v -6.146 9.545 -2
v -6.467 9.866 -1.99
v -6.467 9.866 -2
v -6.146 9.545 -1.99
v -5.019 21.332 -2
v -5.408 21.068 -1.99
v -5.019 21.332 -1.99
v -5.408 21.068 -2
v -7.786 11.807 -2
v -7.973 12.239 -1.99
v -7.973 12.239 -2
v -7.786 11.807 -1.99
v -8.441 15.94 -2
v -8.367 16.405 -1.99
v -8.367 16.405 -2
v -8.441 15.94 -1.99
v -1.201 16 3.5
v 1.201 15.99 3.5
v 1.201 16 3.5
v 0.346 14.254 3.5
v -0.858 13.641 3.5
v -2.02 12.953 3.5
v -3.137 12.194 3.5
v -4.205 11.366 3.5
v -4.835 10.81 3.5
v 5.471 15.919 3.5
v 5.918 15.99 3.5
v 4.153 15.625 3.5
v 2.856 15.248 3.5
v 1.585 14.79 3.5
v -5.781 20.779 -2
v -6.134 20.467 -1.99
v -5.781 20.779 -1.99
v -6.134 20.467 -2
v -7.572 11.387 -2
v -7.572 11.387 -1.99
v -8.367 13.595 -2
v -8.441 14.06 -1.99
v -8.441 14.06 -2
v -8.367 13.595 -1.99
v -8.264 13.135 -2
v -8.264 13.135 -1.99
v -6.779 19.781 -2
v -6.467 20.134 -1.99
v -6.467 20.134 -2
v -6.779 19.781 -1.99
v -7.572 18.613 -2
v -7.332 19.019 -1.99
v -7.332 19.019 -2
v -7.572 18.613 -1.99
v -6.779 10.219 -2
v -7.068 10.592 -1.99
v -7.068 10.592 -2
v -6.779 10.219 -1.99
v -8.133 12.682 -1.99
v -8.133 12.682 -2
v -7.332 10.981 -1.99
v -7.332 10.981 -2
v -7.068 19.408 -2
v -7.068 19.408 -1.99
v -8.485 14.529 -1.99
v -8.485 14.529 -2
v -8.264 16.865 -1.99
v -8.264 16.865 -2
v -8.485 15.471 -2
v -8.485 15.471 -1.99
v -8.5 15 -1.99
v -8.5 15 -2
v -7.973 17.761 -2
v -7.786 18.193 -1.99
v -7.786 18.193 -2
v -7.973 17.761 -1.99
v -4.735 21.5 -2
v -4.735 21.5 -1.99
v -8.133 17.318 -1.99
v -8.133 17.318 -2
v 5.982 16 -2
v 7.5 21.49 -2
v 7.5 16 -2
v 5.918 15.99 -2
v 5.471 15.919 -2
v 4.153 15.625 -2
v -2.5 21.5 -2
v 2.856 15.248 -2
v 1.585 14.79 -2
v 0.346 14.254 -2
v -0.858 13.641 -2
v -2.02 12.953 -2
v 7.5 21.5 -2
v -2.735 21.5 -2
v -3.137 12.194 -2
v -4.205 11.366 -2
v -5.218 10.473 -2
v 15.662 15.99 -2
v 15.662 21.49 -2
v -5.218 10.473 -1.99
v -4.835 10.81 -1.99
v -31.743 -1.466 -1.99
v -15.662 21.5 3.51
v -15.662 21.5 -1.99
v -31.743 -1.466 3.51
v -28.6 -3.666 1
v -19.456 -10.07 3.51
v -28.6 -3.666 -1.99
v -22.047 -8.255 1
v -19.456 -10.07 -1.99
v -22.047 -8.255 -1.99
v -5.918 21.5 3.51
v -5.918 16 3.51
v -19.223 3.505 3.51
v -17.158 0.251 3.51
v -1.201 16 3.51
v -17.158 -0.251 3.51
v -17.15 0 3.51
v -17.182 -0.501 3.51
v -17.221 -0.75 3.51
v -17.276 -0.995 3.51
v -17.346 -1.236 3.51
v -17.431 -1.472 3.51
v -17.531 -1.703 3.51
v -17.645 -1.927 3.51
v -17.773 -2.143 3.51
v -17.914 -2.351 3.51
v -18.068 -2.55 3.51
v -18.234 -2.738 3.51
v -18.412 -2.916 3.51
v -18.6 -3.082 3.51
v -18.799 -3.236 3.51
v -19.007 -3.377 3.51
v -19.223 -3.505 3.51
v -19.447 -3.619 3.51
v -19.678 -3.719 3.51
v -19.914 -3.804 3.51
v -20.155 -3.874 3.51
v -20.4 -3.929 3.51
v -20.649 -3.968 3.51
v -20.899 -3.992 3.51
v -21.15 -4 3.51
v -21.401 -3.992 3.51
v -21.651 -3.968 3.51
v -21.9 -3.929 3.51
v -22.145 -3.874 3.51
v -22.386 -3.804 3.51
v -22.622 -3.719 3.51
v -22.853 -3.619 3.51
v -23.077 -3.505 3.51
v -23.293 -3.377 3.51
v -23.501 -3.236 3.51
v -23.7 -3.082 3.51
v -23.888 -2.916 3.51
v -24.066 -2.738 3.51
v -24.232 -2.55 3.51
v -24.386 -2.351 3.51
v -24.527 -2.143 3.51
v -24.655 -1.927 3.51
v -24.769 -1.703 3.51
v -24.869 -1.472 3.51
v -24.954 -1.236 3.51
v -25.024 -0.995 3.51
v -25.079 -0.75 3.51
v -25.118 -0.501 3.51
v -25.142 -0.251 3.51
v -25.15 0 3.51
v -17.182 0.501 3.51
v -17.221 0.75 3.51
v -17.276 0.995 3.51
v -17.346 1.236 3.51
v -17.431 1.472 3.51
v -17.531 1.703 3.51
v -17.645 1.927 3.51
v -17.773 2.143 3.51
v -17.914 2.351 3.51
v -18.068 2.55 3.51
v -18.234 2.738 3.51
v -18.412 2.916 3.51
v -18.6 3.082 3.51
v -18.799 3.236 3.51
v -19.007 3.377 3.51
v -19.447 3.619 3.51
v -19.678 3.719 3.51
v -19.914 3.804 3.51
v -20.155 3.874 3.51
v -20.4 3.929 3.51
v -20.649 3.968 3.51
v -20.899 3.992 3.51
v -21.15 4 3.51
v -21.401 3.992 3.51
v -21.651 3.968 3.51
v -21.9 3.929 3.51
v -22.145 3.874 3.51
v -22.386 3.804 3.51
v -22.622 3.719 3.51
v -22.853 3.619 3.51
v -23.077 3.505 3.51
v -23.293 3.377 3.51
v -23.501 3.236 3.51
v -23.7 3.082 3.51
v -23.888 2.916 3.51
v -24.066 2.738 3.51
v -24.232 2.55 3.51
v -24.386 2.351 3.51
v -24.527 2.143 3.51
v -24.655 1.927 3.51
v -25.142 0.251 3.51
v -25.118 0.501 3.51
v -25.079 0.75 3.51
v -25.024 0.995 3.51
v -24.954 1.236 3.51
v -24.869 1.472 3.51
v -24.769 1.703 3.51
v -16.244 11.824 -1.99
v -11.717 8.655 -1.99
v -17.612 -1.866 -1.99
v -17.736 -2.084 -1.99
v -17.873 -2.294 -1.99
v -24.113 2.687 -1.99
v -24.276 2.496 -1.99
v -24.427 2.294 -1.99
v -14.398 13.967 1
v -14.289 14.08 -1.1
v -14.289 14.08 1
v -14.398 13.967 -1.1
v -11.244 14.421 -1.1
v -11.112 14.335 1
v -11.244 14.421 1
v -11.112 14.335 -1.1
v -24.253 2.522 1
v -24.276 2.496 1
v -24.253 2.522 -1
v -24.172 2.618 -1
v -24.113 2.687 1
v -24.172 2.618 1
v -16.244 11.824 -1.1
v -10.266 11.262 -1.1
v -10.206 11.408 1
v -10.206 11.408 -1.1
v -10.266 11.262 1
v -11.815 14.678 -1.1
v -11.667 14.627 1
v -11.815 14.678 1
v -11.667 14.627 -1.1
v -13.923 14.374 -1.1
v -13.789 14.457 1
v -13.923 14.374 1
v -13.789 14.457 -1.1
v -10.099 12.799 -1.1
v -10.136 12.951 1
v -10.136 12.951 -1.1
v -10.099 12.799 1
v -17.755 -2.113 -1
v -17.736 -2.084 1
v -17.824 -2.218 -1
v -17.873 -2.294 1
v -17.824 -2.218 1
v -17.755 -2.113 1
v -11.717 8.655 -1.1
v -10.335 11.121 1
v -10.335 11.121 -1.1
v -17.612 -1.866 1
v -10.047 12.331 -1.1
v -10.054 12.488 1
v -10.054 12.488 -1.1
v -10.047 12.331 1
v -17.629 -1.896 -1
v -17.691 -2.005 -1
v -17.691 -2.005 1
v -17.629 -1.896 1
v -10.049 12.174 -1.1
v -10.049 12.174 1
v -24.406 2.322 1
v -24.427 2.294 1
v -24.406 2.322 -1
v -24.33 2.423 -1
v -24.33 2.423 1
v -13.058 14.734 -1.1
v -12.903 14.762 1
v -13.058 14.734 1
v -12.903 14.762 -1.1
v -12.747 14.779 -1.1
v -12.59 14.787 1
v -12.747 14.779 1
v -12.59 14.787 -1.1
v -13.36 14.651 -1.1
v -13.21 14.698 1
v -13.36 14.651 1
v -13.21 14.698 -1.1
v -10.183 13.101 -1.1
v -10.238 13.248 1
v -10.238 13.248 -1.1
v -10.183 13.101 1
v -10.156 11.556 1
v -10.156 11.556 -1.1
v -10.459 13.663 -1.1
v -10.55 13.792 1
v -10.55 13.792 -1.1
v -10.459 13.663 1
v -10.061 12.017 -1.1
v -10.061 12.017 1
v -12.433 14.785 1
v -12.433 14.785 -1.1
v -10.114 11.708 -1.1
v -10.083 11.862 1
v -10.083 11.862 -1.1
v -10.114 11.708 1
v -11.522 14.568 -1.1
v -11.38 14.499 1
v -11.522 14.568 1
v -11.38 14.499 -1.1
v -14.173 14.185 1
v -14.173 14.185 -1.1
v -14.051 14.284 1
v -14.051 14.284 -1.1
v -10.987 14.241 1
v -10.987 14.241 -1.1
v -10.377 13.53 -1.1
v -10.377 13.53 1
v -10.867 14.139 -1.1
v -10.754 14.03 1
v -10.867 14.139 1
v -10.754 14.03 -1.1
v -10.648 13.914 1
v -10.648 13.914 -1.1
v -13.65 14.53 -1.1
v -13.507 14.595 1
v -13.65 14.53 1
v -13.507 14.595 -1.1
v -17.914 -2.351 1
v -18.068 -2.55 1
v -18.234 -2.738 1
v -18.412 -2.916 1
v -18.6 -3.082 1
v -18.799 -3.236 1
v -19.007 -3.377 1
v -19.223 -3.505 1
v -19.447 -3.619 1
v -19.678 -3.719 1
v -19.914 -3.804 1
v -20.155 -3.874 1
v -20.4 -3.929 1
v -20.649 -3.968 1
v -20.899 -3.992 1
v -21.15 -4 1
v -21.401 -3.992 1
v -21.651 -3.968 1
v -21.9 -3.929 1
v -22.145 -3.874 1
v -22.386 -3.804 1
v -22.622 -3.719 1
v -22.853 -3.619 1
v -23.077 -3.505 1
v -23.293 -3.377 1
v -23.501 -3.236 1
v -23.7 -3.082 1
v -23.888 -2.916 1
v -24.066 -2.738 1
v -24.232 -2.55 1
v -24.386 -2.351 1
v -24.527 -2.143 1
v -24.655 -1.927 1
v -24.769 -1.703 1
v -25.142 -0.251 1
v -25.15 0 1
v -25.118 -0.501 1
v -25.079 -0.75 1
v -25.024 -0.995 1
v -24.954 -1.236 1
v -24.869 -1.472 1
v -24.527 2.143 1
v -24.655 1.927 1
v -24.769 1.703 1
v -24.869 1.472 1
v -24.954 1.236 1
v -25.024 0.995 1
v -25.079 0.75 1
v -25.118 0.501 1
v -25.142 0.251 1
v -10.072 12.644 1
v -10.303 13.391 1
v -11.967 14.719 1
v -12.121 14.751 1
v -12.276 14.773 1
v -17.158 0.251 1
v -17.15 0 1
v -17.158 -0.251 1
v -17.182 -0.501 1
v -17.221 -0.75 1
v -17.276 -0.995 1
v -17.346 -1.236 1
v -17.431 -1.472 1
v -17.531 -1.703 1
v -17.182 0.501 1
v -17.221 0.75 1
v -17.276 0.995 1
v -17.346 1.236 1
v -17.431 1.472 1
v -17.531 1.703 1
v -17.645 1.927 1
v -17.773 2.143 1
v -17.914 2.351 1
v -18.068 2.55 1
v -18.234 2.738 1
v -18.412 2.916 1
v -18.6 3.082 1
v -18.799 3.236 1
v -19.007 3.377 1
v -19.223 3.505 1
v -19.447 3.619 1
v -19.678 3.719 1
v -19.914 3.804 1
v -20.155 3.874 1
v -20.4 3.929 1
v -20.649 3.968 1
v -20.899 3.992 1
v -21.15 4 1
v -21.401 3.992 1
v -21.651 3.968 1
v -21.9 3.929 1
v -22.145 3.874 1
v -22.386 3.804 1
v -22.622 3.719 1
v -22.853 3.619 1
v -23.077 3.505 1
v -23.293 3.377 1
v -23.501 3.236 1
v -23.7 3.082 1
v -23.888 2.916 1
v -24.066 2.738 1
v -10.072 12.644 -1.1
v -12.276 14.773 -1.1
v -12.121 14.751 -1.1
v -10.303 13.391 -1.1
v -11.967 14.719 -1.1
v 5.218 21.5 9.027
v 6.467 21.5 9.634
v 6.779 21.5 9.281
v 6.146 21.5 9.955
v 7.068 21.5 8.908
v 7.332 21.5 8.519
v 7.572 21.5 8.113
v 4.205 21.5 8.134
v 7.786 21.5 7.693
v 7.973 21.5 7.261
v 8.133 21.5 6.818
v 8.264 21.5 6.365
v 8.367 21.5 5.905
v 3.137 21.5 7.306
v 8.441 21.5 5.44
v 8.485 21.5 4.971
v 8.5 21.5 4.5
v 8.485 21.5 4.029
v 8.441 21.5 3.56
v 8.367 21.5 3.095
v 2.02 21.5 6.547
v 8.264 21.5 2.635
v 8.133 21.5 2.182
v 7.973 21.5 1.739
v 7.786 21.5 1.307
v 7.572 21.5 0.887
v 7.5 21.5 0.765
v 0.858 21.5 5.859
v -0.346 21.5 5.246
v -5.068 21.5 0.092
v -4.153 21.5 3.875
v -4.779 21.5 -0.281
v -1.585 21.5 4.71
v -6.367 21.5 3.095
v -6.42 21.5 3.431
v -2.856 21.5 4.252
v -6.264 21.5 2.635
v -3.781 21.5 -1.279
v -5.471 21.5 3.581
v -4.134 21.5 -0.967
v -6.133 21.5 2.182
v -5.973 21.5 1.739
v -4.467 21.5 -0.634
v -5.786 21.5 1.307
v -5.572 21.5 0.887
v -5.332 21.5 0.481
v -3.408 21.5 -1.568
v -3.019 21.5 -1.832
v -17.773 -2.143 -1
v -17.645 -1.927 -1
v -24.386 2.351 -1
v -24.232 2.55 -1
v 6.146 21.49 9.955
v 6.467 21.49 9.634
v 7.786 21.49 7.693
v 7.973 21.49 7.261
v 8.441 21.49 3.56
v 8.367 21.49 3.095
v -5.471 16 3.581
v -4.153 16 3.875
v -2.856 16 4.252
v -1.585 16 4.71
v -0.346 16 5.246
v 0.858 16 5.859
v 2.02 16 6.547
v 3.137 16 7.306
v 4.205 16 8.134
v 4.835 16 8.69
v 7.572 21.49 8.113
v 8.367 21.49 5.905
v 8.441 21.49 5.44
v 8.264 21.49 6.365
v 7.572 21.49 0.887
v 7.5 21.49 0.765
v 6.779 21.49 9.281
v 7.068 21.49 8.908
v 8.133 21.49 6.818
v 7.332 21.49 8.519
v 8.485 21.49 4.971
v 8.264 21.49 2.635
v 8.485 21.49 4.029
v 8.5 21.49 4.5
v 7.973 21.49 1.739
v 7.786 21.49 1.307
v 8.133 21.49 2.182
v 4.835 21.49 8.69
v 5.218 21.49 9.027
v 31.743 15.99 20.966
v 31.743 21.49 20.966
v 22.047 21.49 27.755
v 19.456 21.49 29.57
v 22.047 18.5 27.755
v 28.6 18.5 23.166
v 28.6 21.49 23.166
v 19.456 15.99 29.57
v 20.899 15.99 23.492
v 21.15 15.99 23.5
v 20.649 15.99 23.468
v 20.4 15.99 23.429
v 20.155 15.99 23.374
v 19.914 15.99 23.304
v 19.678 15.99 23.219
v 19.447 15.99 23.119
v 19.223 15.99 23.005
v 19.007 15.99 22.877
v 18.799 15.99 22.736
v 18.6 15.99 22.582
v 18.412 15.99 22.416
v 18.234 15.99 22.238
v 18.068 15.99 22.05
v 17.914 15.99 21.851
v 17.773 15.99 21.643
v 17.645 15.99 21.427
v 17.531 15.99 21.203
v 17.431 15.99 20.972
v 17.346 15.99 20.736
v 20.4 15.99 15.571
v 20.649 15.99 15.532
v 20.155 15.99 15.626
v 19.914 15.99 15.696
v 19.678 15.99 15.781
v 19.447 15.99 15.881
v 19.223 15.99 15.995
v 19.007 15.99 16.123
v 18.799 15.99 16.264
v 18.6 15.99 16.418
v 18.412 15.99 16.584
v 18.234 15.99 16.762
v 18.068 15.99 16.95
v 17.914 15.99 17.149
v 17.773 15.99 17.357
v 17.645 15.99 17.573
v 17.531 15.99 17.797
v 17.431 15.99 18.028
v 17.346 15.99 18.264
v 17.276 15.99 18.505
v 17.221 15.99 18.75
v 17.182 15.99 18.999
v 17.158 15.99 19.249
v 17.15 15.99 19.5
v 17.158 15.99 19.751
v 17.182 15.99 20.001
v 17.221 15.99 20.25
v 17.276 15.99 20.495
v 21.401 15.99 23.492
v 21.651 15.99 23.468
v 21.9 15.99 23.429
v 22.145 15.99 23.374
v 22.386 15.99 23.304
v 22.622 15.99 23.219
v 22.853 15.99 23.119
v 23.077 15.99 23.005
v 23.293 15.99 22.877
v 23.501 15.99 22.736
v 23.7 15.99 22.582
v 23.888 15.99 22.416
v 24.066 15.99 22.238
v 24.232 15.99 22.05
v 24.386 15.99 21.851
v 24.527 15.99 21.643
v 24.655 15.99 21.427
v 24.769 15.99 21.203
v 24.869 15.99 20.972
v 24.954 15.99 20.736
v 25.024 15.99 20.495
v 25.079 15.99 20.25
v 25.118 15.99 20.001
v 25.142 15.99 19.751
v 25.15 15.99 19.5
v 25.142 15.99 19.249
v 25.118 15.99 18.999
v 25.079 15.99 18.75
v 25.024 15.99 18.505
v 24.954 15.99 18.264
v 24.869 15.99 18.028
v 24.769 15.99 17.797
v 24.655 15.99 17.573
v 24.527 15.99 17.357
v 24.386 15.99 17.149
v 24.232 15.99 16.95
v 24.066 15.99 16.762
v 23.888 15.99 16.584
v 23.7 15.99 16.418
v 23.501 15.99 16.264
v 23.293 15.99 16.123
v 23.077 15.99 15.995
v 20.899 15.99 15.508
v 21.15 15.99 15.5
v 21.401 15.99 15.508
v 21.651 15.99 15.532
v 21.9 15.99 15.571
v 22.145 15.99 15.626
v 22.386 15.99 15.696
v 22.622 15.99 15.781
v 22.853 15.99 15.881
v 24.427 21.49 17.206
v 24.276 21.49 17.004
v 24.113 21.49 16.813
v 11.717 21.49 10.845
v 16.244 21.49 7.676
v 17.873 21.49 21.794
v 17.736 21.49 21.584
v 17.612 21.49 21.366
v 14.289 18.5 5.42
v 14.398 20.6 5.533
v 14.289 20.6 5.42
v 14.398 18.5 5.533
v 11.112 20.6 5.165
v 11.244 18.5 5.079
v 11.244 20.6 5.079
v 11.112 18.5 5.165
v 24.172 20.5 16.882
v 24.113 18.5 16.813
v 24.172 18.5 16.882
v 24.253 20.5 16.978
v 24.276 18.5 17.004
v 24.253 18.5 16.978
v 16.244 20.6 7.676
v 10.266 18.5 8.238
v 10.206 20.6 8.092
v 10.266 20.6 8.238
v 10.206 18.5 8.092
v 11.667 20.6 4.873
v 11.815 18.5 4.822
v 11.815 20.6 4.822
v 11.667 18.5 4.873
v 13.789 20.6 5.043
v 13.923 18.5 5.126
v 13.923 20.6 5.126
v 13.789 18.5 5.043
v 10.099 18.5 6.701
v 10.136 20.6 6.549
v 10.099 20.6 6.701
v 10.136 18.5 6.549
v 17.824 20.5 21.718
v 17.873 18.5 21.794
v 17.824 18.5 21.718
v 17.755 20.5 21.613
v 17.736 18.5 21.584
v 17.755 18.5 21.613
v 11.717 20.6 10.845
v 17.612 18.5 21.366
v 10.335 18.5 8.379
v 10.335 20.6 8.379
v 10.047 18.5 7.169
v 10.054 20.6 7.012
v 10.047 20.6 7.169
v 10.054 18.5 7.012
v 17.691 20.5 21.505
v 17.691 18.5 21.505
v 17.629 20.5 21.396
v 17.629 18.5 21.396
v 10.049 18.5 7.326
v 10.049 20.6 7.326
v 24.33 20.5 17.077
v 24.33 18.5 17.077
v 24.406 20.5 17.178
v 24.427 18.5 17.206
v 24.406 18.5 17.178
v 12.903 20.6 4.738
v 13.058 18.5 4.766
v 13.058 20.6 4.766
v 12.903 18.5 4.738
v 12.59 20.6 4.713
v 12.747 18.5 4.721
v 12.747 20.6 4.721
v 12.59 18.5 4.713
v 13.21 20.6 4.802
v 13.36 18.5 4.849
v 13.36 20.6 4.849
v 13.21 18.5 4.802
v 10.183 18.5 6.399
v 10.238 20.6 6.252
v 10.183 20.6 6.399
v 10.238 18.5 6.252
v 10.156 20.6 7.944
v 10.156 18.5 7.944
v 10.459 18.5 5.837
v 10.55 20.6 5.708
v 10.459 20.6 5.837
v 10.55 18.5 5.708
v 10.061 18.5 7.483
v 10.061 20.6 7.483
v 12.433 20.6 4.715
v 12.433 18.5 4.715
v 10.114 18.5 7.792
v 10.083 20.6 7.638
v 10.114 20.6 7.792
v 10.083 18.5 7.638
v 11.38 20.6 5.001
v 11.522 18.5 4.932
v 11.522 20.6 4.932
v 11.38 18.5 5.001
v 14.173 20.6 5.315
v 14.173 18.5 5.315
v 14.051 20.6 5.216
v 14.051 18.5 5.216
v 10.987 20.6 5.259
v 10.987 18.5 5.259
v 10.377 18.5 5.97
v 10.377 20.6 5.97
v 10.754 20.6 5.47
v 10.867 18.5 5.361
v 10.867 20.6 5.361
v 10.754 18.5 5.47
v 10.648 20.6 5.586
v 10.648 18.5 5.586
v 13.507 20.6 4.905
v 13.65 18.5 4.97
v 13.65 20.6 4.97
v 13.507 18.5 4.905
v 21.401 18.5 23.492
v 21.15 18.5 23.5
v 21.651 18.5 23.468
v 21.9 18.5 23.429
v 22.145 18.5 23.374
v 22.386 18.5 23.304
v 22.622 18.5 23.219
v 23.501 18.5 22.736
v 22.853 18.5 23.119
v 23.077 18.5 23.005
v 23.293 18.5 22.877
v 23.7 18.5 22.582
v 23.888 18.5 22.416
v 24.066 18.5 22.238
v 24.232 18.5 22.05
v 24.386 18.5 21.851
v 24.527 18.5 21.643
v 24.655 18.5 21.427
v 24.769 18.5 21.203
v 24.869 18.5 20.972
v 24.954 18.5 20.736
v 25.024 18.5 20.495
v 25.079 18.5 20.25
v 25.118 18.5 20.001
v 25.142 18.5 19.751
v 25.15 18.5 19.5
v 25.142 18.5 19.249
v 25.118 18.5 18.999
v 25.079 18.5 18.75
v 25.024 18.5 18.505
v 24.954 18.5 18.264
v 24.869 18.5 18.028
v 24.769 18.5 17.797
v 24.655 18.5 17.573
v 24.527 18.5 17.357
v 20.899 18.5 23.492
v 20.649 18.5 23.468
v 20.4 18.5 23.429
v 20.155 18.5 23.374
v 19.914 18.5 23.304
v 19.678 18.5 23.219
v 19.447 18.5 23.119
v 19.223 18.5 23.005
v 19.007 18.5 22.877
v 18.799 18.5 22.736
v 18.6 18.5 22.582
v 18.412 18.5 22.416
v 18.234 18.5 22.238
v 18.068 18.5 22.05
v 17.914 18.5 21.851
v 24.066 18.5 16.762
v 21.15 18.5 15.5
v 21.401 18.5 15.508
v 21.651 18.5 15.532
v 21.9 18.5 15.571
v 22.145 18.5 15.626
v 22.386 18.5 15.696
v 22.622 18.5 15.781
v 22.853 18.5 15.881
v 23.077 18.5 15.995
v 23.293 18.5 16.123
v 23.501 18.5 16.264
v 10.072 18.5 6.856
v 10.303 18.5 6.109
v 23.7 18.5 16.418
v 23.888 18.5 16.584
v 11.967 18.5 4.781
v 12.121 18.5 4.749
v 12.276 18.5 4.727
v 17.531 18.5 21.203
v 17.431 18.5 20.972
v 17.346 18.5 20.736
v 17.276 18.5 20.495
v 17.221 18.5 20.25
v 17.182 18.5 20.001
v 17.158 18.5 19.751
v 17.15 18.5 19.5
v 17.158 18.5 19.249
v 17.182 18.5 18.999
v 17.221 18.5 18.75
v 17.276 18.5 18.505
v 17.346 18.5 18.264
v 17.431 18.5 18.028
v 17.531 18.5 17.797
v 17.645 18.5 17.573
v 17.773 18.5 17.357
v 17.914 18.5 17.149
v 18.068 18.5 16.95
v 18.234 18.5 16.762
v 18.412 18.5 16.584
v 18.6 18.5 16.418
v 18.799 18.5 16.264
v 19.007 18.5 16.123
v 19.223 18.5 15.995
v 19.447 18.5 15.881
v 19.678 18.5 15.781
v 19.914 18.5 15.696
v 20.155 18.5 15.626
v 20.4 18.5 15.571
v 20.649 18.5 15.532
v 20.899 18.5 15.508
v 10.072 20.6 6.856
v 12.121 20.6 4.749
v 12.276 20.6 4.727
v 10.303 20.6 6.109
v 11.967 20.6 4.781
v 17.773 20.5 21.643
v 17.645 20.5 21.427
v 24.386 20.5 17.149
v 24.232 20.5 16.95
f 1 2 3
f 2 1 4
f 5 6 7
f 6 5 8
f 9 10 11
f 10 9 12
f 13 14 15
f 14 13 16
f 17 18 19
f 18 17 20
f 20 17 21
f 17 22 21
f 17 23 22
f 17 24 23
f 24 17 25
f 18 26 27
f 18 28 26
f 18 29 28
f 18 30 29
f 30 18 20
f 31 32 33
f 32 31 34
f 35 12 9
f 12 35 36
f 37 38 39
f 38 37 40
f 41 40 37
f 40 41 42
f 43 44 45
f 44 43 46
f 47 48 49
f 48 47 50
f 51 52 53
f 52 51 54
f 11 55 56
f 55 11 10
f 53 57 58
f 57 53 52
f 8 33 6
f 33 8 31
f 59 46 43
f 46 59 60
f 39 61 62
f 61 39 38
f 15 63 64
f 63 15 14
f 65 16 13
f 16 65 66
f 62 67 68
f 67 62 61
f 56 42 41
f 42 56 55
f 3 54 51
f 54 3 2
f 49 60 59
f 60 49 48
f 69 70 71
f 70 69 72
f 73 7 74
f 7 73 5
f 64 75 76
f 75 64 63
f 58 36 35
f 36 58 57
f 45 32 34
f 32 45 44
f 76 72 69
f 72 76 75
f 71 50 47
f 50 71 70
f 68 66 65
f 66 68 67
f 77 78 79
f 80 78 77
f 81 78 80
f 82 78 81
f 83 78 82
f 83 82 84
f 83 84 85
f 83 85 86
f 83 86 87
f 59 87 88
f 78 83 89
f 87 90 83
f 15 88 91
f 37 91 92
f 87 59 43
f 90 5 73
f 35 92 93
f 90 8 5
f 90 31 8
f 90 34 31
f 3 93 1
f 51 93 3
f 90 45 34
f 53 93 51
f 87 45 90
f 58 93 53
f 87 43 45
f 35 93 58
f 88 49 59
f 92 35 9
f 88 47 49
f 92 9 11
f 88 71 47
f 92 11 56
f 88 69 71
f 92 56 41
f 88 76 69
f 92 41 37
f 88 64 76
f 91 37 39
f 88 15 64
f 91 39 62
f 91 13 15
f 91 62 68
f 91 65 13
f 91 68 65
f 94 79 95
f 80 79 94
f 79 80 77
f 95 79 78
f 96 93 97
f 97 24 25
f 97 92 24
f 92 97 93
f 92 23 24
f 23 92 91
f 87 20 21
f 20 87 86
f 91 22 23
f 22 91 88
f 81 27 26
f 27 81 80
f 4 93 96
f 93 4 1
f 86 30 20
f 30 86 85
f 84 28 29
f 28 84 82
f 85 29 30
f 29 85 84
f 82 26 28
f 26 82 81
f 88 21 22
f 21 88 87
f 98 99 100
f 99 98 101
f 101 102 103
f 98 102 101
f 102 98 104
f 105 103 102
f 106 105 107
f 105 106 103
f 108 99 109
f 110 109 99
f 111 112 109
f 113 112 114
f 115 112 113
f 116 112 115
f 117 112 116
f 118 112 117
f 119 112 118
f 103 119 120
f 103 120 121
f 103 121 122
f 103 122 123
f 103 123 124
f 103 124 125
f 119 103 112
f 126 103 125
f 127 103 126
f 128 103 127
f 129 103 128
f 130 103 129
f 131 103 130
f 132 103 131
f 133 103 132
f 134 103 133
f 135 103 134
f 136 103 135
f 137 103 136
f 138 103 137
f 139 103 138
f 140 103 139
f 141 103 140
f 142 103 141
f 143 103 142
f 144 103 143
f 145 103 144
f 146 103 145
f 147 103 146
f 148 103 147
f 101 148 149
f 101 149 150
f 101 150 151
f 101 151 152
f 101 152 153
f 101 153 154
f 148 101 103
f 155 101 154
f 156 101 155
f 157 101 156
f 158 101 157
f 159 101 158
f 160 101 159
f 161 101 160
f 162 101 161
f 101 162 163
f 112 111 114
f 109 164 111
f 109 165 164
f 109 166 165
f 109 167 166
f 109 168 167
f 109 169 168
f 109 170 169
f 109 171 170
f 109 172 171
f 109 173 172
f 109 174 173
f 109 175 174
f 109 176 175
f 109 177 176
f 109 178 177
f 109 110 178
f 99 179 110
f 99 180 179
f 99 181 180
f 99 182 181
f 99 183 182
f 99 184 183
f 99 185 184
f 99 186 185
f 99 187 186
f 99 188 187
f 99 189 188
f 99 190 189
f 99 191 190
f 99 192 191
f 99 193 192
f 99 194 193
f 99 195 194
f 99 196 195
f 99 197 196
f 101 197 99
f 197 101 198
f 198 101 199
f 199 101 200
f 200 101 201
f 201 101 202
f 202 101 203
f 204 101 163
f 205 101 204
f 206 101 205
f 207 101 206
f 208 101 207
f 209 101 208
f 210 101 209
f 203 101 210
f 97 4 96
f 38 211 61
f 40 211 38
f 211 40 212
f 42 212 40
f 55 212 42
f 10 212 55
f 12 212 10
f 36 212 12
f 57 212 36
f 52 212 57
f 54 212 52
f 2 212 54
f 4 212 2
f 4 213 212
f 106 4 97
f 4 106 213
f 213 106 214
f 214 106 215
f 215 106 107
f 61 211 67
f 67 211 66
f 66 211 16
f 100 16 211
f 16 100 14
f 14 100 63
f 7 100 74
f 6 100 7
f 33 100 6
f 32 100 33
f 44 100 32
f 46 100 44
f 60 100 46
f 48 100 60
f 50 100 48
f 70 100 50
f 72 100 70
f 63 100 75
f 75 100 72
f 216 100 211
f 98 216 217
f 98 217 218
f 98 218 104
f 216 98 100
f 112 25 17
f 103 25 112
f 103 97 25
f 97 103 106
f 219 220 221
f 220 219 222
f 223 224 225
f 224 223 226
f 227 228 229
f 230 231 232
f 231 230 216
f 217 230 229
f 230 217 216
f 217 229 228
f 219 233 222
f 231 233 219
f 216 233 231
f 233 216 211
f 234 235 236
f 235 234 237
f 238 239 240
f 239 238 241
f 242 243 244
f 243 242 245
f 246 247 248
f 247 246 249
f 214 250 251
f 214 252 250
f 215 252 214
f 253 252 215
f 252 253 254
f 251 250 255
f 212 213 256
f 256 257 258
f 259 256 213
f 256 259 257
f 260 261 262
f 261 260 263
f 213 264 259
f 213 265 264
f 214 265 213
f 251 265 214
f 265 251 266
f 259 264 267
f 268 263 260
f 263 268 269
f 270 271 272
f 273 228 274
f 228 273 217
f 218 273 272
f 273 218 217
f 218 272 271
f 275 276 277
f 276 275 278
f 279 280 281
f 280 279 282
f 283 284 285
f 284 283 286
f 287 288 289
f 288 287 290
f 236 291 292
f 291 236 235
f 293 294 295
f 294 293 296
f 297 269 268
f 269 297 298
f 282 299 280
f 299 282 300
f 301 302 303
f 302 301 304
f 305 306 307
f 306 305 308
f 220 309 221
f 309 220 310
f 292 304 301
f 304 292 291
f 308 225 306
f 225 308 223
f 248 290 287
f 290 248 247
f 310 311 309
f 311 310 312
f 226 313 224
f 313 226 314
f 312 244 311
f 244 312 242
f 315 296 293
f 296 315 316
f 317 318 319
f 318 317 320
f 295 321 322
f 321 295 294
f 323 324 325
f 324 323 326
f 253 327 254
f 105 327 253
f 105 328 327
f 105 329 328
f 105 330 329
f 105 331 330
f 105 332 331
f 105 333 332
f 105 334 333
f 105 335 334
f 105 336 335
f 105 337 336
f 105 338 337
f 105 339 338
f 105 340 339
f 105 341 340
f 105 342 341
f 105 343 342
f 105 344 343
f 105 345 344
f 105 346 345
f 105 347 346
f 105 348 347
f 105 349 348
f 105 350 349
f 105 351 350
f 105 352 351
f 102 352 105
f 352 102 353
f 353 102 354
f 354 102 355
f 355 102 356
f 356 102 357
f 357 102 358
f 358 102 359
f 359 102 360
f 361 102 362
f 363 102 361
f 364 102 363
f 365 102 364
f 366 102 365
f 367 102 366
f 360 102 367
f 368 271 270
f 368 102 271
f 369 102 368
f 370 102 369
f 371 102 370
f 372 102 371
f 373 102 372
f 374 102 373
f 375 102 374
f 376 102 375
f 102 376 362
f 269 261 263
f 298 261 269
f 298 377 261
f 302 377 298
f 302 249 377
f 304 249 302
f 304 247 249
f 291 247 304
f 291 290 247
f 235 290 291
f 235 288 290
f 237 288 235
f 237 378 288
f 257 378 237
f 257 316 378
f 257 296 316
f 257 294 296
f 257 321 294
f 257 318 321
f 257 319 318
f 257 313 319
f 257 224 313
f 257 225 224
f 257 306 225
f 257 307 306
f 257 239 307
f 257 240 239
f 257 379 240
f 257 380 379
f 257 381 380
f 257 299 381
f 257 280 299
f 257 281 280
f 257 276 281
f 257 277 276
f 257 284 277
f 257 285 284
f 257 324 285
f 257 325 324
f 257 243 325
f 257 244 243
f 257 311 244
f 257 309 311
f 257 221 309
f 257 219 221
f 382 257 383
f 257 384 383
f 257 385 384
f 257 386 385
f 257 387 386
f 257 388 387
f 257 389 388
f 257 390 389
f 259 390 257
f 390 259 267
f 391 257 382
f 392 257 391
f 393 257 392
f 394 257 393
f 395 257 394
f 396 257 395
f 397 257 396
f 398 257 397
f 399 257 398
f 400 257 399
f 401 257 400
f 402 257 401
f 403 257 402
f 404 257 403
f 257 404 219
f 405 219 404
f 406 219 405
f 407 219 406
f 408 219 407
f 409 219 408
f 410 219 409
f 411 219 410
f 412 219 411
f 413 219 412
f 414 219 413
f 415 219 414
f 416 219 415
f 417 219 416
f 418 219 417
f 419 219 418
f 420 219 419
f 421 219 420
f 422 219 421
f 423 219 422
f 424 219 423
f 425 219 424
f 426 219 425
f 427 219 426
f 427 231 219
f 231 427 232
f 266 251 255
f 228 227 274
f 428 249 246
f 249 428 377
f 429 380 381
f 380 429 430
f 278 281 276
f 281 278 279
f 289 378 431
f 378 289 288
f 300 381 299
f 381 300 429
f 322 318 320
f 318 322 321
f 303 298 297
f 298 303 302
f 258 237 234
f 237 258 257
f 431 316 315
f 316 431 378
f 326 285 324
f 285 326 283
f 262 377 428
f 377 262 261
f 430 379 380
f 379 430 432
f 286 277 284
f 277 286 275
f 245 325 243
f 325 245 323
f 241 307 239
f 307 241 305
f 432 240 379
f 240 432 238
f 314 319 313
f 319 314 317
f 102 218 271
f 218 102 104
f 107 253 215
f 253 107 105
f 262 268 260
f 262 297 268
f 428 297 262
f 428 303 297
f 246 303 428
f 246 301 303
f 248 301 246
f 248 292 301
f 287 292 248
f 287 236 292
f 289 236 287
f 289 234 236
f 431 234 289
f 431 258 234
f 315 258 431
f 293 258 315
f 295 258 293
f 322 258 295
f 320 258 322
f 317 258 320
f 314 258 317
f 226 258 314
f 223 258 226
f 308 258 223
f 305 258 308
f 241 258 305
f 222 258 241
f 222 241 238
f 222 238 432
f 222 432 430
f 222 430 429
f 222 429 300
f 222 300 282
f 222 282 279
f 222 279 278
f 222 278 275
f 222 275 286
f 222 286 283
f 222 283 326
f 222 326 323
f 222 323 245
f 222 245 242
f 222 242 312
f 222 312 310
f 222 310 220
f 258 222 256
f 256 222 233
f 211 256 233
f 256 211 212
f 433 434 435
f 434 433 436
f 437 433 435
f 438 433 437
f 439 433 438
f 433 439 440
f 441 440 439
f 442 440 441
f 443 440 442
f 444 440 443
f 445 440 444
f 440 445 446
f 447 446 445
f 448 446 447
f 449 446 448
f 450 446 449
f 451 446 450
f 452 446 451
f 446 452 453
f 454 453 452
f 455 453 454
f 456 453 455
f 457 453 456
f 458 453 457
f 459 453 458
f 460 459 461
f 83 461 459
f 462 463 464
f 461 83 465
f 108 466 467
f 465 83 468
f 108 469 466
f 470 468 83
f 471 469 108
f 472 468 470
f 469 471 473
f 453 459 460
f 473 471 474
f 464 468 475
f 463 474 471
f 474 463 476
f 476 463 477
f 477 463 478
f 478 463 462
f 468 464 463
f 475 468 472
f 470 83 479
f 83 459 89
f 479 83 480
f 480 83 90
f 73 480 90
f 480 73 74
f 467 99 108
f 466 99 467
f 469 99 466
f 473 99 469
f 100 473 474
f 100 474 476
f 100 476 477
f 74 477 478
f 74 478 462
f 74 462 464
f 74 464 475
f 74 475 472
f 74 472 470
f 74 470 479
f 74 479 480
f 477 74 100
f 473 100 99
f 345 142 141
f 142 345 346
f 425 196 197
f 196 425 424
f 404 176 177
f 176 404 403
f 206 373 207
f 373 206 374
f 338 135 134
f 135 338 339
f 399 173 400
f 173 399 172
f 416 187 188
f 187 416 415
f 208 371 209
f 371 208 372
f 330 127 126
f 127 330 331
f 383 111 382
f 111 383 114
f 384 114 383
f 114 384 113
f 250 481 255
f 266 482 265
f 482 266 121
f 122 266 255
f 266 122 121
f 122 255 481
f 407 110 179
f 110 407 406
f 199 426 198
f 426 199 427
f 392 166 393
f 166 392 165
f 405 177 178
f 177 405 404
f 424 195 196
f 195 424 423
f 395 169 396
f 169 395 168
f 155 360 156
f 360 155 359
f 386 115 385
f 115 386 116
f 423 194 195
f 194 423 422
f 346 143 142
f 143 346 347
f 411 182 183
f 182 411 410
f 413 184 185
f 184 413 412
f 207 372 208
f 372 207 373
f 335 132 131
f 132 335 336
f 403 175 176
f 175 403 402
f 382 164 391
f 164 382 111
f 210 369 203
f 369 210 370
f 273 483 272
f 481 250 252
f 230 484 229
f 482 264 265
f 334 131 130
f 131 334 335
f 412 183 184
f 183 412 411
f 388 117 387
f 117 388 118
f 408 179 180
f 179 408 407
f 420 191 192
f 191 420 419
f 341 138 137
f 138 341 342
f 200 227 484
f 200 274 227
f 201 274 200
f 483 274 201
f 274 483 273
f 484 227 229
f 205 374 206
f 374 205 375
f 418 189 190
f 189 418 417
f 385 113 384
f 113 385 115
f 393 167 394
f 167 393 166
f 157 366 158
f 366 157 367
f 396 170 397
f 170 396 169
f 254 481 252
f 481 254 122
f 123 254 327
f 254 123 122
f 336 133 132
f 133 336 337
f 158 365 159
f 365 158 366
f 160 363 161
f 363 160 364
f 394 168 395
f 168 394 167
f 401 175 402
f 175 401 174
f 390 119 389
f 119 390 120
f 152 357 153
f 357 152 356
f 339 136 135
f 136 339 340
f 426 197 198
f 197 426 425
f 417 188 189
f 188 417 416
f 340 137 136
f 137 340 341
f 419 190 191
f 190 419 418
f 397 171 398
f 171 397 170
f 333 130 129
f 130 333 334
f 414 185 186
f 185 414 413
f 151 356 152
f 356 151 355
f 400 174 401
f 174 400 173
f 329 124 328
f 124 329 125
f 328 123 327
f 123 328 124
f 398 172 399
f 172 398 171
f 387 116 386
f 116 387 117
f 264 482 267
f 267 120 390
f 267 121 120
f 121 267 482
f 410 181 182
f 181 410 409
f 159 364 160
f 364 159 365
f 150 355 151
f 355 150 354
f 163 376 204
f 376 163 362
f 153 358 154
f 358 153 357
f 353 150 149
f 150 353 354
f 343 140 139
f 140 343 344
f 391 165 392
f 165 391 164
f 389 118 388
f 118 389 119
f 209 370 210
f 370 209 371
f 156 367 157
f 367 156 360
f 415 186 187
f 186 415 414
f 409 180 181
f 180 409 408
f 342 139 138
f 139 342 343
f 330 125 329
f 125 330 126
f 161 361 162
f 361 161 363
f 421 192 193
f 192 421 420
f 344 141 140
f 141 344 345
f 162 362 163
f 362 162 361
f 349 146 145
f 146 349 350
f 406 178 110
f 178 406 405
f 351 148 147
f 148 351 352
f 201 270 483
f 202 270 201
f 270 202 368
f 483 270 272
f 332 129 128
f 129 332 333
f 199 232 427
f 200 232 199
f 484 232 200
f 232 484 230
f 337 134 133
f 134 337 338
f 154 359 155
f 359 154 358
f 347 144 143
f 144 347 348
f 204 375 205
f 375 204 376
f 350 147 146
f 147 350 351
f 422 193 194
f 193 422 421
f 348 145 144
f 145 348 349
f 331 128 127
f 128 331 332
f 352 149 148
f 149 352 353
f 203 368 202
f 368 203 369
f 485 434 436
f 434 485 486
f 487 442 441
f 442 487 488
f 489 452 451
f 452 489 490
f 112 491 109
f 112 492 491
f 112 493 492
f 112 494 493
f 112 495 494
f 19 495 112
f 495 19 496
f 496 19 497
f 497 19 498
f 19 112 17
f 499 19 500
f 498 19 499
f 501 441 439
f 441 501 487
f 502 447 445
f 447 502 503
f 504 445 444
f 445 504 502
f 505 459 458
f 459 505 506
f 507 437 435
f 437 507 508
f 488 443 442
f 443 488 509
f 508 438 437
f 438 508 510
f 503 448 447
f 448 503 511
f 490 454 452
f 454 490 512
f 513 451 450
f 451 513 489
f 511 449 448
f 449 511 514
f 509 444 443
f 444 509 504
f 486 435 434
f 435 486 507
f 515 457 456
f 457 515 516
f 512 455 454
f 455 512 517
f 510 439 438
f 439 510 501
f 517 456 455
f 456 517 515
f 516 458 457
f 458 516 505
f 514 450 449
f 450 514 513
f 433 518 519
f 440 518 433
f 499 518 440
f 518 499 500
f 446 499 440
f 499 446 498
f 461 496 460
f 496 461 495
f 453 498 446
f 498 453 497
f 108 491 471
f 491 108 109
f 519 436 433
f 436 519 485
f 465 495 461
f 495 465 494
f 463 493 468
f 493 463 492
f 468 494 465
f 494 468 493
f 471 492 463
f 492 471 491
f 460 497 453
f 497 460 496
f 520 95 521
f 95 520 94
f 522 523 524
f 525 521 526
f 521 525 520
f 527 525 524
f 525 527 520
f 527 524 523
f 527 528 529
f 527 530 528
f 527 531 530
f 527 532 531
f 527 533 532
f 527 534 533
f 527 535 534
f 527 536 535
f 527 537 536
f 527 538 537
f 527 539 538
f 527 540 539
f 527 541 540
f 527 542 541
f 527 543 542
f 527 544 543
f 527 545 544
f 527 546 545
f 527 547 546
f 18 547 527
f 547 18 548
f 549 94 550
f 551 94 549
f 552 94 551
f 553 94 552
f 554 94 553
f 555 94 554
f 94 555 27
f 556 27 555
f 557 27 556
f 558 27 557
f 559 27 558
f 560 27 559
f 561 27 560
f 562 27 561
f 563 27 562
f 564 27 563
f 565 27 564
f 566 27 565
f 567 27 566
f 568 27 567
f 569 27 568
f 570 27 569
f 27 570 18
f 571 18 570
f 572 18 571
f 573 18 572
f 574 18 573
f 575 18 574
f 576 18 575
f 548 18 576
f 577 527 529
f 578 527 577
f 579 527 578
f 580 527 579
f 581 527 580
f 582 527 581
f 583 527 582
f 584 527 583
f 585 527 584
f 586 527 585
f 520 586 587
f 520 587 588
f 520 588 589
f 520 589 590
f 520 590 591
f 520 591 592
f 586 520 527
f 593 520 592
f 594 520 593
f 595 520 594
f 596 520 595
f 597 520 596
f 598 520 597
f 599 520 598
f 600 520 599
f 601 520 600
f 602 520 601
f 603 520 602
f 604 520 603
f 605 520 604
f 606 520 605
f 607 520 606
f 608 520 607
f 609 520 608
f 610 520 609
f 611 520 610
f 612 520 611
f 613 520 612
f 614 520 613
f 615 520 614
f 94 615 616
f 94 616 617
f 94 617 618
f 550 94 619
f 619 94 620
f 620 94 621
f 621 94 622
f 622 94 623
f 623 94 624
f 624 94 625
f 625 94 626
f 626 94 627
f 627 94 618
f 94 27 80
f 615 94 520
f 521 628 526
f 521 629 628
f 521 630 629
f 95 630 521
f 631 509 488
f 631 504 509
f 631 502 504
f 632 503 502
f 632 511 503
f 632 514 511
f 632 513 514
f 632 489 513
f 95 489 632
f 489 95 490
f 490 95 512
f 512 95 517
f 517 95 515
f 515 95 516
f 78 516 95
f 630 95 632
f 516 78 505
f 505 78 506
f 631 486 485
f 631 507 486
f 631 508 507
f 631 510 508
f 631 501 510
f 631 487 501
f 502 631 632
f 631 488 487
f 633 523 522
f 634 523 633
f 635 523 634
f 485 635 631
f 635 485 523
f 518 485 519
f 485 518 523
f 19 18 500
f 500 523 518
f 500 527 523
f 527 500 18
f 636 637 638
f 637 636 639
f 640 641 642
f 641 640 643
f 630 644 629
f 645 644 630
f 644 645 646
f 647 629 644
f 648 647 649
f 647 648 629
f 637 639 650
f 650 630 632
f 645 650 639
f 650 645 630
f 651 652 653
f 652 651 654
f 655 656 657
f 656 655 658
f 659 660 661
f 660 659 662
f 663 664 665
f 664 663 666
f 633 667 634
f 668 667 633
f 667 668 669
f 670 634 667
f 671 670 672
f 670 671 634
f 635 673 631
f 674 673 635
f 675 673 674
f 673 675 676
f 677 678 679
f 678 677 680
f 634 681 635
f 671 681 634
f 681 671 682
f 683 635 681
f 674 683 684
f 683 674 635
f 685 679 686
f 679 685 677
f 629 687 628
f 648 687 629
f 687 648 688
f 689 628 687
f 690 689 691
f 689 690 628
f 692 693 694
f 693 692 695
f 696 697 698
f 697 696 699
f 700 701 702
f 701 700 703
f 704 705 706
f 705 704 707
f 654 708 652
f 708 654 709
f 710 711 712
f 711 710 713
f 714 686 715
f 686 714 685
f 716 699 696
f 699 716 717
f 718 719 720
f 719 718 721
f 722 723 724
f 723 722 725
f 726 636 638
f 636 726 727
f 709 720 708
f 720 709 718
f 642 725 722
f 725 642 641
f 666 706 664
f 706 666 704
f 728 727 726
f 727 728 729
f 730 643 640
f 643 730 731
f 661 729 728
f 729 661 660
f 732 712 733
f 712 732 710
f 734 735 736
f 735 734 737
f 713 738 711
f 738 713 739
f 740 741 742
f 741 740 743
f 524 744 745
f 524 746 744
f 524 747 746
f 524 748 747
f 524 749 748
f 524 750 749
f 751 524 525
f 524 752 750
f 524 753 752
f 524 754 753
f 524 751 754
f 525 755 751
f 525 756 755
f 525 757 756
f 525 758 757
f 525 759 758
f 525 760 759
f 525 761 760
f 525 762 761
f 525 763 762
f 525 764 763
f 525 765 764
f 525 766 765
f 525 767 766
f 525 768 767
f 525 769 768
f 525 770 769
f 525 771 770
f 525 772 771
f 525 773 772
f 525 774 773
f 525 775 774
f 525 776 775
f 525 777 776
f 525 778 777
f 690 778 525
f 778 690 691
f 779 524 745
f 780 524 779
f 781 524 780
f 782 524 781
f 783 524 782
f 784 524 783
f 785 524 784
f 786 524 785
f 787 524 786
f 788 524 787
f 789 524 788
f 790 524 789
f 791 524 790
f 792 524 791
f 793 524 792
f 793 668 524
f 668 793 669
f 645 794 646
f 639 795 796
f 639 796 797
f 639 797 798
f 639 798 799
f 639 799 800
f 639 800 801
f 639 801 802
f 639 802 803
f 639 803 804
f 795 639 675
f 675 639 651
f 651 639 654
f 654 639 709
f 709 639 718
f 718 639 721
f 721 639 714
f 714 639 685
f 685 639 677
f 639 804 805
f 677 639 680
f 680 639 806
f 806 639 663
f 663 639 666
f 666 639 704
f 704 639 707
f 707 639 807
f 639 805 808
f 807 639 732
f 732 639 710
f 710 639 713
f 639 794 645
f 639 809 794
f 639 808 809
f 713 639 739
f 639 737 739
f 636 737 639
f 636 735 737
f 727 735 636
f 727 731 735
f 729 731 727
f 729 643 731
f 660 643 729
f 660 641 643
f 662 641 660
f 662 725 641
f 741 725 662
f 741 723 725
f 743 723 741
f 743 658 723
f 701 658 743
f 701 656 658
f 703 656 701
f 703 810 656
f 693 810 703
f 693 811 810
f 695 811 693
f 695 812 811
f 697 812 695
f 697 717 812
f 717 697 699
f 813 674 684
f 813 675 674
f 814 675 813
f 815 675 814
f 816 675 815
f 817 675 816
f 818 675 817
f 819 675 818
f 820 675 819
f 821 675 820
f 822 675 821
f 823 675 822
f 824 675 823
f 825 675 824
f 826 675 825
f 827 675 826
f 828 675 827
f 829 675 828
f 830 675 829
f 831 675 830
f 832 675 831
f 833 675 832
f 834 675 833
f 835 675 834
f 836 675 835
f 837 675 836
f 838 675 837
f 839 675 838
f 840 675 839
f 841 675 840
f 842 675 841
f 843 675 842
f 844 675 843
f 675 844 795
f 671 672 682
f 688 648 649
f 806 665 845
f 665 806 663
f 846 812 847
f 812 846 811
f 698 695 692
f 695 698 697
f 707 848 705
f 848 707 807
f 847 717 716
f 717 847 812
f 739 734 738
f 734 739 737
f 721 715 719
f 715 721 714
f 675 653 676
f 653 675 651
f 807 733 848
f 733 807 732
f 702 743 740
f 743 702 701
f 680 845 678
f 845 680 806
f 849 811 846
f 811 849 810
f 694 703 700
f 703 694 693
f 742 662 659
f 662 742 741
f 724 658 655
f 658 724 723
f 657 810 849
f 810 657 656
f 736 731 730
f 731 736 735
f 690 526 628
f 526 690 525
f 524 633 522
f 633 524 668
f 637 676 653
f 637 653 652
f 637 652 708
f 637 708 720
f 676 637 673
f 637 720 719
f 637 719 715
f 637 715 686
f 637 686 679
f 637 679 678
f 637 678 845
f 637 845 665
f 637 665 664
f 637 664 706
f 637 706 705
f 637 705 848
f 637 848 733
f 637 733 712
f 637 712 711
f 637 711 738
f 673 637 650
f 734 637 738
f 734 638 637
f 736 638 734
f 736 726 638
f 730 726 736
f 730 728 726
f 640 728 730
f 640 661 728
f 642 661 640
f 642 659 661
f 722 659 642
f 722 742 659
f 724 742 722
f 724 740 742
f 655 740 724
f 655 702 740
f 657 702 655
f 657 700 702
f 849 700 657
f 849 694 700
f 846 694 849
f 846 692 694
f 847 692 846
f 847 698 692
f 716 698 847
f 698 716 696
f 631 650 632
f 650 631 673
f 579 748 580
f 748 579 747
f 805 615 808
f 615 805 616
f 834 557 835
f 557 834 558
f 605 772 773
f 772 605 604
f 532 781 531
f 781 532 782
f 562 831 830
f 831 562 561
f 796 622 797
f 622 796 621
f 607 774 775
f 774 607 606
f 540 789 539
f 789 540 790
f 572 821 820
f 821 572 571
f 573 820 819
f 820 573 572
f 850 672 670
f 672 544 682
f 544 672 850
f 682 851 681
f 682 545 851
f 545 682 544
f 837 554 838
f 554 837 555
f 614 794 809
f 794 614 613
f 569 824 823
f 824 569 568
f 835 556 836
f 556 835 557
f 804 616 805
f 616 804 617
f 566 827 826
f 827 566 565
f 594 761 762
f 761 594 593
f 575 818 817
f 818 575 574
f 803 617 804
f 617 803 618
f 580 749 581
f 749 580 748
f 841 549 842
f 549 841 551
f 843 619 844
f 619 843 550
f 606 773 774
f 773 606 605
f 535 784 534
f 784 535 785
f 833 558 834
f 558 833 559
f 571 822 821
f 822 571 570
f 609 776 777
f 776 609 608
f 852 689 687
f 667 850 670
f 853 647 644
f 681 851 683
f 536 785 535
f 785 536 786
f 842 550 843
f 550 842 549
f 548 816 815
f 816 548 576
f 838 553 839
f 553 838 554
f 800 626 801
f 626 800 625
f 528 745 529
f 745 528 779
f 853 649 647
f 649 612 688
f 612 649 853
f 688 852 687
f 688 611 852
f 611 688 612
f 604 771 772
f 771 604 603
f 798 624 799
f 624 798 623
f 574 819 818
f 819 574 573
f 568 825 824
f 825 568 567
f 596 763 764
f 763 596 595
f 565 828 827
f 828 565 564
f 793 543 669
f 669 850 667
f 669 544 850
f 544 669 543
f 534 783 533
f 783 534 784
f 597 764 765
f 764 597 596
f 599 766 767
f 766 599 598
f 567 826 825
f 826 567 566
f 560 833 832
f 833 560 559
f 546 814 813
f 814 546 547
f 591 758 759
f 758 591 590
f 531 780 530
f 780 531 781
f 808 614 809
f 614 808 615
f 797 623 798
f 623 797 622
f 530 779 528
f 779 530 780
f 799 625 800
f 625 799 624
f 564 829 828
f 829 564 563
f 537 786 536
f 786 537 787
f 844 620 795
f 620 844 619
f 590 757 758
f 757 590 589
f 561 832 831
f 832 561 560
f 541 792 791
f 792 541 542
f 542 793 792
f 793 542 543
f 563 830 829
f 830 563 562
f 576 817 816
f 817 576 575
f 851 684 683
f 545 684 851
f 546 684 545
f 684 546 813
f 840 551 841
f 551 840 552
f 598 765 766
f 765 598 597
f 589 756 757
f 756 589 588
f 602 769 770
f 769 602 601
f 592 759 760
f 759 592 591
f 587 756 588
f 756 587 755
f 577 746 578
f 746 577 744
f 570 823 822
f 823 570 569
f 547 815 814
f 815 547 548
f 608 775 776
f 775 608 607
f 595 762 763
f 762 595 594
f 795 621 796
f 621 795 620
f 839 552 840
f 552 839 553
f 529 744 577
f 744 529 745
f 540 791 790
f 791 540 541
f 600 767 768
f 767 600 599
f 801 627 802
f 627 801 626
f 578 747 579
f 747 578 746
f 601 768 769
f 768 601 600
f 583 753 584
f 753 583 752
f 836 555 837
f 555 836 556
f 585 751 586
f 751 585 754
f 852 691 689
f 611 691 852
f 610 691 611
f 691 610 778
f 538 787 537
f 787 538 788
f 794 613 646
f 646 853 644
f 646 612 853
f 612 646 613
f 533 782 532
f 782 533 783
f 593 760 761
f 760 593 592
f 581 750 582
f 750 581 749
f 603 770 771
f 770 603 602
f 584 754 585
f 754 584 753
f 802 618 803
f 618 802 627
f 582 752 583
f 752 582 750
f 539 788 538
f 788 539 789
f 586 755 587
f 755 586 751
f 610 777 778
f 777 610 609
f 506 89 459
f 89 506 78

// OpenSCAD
//9g generic
//shoulder(26,5.5,3.5,2,13);
//tower servo
translate([0,0,19.5]) rotate([0,-90,0]) shoulder(27,7,4,2.5,15);

module hornbracket(hr_st,hh,hrd,hr1,hr2) {
	height=3;
	//horn bracket
	translate([hr_st-1,0,0]) difference(){
		union() {
		translate([-1+0.01,22,-3]) rotate([55,0,0]) cube([5.5,15,hh+18]);
		
		difference() {
			translate([-1,15,1]) rotate([0,90,0]) cylinder(r=hr2+5,h=5.5,$fn=100);
			translate([-1.05,-5.2,-9.5]) rotate([0,90,0]) cylinder(r=hr2+19,h=5.6,$fn=100);
		}
		}
		//make flat side 
		translate([-2-0.1,21.5,-3]) cube([6.5+0.2,hh,hh]);
		//servo horn hole
		translate([0,0,hh]) rotate([0,90,0]) cylinder(r=hr1,h=6,$fn=100);
		//servo horn channel
		/*translate([-1,0,hh]) rotate([55,0,0]) union() {
			hull(){	
				translate([0,0,0]) rotate([0,90,0]) cylinder(r=hr1,h=height,$fn=100);	
				translate([0,0,-hrd]) rotate([0,90,0]) cylinder(r=hr2,h=height,$fn=100);
			}
			translate([0,-hr1,0]) cube([height,hr1*2,9]);
		}*/
			translate([-1,0,hh]) rotate([55,0,0]) difference() {
				union() {
					hull(){	
						translate([0,0,0]) rotate([0,90,0]) cylinder(r=hr1,h=height,$fn=100);	
					translate([0,0,-hrd]) rotate([0,90,0]) cylinder(r=hr2,h=height,$fn=100);	
					}
					translate([0,-hr1,0]) cube([height,hr1*2,9]); //top square
				}
			translate([-0.1,-hr1-0.1,-hrd-hr2]) cube([1,hr1*2+0.2,hr2*2]); //subtract the tip clip
		}
	}
}

module shoulder(st,sc,hr1,hr2,hrd){
	// st = servo tall gap
	// cc = servo clearance from inside wall
	// hr1 = horn radius1
	// hr2 = horn radius2
	// hrd = distance between horn radii

	//bottom plate constants
	plate_thick = 3.5;
	offset_x = 4; offset_y = 4;
	m3_screw_dia = 3;
	m3_screw_head_dia = 7;
	m3_screw_head_height = 1.75;
	m3_nut_wrench_size = 6.5;
	m3_nut_height = 1.75;

	//calc'd starts
	ch_st = (st/2)-1;
	hr_st = -((st/2)+6);

	hh = sc+14.15;

	//channel bracket
	/*difference(){
		union(){
			//vert wall
			translate([ch_st,-8,0]) cube([6,16,hh+.35]);
			//round top
			translate([ch_st,0,hh+.35]) rotate([0,90,0]) cylinder(r=8, h=6, $fn=100);
		}
		// button hole bottom
		translate([ch_st,0,hh]) rotate([0,90,0]) cylinder(r=3,h=6,$fn=100);		
		// button hole top
		translate([ch_st-2,0,hh-.1]) rotate([0,90,0]) cylinder(r=5.6,h=3,$fn=100);	
		//bottom channel
		translate([ch_st+5,-5,-1]) cube([2,10,30]);
	}*/
	


	difference(){
		//intersection() {
			union() {
				hornbracket(hr_st,hh,hrd,hr1,hr2);
				rotate([0,180,90]) hornbracket(hr_st,hh,hrd,hr1,hr2);
				//translate([-19.5,9.5+5,2.5]) rotate([0,90,0]) cube([10,5,5]);
				translate([-21.5,9.5+6.5,-7.5]) cube([5.5,5.5,10]);
				
				//translate([-23.5,20,-23.5]) rotate([90,0,0]) cylinder(r=5,h=80,$fn=100);
			}
	
			//translate([-23,25,-40]) cylinder(r=33,h=80,$fn=100);
		//}
		//translate([-38,14,-10]) rotate([0,55,0]) cube([40,15,15]);
		//	translate([8,-8,-40]) cylinder(r=22.5,h=80,$fn=100);
		//	translate([-24,8.5,14]) cube([12,18,30]);
		//	translate([-40,23,18.5]) rotate([0,90,0]) cylinder(r=15,h=80,$fn=100);
		//main plate
		//translate([-19,-8,0]) cube([37,16,plate_thick]);
		//screw holes
		//for (i = [[offset_x-.5,offset_y,-1],[offset_x-.5,-offset_y,-1],[-offset_x-.5,offset_y,-1],[-offset_x-.5,-offset_y,-1]]){	
		//	translate(i) cylinder(r=m3_screw_dia/2, h=plate_thick+2, $fn=20);
		//}
		//screw head holes
		//for (i = [[offset_x-.5,-offset_y,plate_thick-m3_screw_head_height+.1],[-offset_x-.5,-offset_y,plate_thick-m3_screw_head_height+.1]]){
		//	translate(i) cylinder(r=m3_screw_head_dia/2, h=m3_screw_head_height, $fn=20);
		//}
		//nut traps
		//for (i = [[offset_x-.5,offset_y,plate_thick-m3_nut_height+.1],[-offset_x-.5,offset_y,plate_thick-m3_nut_height+.1]]){
		//	translate(i) cylinder(r=m3_nut_wrench_size/2, h=m3_nut_height, $fn=6);
		//}
	}
}
